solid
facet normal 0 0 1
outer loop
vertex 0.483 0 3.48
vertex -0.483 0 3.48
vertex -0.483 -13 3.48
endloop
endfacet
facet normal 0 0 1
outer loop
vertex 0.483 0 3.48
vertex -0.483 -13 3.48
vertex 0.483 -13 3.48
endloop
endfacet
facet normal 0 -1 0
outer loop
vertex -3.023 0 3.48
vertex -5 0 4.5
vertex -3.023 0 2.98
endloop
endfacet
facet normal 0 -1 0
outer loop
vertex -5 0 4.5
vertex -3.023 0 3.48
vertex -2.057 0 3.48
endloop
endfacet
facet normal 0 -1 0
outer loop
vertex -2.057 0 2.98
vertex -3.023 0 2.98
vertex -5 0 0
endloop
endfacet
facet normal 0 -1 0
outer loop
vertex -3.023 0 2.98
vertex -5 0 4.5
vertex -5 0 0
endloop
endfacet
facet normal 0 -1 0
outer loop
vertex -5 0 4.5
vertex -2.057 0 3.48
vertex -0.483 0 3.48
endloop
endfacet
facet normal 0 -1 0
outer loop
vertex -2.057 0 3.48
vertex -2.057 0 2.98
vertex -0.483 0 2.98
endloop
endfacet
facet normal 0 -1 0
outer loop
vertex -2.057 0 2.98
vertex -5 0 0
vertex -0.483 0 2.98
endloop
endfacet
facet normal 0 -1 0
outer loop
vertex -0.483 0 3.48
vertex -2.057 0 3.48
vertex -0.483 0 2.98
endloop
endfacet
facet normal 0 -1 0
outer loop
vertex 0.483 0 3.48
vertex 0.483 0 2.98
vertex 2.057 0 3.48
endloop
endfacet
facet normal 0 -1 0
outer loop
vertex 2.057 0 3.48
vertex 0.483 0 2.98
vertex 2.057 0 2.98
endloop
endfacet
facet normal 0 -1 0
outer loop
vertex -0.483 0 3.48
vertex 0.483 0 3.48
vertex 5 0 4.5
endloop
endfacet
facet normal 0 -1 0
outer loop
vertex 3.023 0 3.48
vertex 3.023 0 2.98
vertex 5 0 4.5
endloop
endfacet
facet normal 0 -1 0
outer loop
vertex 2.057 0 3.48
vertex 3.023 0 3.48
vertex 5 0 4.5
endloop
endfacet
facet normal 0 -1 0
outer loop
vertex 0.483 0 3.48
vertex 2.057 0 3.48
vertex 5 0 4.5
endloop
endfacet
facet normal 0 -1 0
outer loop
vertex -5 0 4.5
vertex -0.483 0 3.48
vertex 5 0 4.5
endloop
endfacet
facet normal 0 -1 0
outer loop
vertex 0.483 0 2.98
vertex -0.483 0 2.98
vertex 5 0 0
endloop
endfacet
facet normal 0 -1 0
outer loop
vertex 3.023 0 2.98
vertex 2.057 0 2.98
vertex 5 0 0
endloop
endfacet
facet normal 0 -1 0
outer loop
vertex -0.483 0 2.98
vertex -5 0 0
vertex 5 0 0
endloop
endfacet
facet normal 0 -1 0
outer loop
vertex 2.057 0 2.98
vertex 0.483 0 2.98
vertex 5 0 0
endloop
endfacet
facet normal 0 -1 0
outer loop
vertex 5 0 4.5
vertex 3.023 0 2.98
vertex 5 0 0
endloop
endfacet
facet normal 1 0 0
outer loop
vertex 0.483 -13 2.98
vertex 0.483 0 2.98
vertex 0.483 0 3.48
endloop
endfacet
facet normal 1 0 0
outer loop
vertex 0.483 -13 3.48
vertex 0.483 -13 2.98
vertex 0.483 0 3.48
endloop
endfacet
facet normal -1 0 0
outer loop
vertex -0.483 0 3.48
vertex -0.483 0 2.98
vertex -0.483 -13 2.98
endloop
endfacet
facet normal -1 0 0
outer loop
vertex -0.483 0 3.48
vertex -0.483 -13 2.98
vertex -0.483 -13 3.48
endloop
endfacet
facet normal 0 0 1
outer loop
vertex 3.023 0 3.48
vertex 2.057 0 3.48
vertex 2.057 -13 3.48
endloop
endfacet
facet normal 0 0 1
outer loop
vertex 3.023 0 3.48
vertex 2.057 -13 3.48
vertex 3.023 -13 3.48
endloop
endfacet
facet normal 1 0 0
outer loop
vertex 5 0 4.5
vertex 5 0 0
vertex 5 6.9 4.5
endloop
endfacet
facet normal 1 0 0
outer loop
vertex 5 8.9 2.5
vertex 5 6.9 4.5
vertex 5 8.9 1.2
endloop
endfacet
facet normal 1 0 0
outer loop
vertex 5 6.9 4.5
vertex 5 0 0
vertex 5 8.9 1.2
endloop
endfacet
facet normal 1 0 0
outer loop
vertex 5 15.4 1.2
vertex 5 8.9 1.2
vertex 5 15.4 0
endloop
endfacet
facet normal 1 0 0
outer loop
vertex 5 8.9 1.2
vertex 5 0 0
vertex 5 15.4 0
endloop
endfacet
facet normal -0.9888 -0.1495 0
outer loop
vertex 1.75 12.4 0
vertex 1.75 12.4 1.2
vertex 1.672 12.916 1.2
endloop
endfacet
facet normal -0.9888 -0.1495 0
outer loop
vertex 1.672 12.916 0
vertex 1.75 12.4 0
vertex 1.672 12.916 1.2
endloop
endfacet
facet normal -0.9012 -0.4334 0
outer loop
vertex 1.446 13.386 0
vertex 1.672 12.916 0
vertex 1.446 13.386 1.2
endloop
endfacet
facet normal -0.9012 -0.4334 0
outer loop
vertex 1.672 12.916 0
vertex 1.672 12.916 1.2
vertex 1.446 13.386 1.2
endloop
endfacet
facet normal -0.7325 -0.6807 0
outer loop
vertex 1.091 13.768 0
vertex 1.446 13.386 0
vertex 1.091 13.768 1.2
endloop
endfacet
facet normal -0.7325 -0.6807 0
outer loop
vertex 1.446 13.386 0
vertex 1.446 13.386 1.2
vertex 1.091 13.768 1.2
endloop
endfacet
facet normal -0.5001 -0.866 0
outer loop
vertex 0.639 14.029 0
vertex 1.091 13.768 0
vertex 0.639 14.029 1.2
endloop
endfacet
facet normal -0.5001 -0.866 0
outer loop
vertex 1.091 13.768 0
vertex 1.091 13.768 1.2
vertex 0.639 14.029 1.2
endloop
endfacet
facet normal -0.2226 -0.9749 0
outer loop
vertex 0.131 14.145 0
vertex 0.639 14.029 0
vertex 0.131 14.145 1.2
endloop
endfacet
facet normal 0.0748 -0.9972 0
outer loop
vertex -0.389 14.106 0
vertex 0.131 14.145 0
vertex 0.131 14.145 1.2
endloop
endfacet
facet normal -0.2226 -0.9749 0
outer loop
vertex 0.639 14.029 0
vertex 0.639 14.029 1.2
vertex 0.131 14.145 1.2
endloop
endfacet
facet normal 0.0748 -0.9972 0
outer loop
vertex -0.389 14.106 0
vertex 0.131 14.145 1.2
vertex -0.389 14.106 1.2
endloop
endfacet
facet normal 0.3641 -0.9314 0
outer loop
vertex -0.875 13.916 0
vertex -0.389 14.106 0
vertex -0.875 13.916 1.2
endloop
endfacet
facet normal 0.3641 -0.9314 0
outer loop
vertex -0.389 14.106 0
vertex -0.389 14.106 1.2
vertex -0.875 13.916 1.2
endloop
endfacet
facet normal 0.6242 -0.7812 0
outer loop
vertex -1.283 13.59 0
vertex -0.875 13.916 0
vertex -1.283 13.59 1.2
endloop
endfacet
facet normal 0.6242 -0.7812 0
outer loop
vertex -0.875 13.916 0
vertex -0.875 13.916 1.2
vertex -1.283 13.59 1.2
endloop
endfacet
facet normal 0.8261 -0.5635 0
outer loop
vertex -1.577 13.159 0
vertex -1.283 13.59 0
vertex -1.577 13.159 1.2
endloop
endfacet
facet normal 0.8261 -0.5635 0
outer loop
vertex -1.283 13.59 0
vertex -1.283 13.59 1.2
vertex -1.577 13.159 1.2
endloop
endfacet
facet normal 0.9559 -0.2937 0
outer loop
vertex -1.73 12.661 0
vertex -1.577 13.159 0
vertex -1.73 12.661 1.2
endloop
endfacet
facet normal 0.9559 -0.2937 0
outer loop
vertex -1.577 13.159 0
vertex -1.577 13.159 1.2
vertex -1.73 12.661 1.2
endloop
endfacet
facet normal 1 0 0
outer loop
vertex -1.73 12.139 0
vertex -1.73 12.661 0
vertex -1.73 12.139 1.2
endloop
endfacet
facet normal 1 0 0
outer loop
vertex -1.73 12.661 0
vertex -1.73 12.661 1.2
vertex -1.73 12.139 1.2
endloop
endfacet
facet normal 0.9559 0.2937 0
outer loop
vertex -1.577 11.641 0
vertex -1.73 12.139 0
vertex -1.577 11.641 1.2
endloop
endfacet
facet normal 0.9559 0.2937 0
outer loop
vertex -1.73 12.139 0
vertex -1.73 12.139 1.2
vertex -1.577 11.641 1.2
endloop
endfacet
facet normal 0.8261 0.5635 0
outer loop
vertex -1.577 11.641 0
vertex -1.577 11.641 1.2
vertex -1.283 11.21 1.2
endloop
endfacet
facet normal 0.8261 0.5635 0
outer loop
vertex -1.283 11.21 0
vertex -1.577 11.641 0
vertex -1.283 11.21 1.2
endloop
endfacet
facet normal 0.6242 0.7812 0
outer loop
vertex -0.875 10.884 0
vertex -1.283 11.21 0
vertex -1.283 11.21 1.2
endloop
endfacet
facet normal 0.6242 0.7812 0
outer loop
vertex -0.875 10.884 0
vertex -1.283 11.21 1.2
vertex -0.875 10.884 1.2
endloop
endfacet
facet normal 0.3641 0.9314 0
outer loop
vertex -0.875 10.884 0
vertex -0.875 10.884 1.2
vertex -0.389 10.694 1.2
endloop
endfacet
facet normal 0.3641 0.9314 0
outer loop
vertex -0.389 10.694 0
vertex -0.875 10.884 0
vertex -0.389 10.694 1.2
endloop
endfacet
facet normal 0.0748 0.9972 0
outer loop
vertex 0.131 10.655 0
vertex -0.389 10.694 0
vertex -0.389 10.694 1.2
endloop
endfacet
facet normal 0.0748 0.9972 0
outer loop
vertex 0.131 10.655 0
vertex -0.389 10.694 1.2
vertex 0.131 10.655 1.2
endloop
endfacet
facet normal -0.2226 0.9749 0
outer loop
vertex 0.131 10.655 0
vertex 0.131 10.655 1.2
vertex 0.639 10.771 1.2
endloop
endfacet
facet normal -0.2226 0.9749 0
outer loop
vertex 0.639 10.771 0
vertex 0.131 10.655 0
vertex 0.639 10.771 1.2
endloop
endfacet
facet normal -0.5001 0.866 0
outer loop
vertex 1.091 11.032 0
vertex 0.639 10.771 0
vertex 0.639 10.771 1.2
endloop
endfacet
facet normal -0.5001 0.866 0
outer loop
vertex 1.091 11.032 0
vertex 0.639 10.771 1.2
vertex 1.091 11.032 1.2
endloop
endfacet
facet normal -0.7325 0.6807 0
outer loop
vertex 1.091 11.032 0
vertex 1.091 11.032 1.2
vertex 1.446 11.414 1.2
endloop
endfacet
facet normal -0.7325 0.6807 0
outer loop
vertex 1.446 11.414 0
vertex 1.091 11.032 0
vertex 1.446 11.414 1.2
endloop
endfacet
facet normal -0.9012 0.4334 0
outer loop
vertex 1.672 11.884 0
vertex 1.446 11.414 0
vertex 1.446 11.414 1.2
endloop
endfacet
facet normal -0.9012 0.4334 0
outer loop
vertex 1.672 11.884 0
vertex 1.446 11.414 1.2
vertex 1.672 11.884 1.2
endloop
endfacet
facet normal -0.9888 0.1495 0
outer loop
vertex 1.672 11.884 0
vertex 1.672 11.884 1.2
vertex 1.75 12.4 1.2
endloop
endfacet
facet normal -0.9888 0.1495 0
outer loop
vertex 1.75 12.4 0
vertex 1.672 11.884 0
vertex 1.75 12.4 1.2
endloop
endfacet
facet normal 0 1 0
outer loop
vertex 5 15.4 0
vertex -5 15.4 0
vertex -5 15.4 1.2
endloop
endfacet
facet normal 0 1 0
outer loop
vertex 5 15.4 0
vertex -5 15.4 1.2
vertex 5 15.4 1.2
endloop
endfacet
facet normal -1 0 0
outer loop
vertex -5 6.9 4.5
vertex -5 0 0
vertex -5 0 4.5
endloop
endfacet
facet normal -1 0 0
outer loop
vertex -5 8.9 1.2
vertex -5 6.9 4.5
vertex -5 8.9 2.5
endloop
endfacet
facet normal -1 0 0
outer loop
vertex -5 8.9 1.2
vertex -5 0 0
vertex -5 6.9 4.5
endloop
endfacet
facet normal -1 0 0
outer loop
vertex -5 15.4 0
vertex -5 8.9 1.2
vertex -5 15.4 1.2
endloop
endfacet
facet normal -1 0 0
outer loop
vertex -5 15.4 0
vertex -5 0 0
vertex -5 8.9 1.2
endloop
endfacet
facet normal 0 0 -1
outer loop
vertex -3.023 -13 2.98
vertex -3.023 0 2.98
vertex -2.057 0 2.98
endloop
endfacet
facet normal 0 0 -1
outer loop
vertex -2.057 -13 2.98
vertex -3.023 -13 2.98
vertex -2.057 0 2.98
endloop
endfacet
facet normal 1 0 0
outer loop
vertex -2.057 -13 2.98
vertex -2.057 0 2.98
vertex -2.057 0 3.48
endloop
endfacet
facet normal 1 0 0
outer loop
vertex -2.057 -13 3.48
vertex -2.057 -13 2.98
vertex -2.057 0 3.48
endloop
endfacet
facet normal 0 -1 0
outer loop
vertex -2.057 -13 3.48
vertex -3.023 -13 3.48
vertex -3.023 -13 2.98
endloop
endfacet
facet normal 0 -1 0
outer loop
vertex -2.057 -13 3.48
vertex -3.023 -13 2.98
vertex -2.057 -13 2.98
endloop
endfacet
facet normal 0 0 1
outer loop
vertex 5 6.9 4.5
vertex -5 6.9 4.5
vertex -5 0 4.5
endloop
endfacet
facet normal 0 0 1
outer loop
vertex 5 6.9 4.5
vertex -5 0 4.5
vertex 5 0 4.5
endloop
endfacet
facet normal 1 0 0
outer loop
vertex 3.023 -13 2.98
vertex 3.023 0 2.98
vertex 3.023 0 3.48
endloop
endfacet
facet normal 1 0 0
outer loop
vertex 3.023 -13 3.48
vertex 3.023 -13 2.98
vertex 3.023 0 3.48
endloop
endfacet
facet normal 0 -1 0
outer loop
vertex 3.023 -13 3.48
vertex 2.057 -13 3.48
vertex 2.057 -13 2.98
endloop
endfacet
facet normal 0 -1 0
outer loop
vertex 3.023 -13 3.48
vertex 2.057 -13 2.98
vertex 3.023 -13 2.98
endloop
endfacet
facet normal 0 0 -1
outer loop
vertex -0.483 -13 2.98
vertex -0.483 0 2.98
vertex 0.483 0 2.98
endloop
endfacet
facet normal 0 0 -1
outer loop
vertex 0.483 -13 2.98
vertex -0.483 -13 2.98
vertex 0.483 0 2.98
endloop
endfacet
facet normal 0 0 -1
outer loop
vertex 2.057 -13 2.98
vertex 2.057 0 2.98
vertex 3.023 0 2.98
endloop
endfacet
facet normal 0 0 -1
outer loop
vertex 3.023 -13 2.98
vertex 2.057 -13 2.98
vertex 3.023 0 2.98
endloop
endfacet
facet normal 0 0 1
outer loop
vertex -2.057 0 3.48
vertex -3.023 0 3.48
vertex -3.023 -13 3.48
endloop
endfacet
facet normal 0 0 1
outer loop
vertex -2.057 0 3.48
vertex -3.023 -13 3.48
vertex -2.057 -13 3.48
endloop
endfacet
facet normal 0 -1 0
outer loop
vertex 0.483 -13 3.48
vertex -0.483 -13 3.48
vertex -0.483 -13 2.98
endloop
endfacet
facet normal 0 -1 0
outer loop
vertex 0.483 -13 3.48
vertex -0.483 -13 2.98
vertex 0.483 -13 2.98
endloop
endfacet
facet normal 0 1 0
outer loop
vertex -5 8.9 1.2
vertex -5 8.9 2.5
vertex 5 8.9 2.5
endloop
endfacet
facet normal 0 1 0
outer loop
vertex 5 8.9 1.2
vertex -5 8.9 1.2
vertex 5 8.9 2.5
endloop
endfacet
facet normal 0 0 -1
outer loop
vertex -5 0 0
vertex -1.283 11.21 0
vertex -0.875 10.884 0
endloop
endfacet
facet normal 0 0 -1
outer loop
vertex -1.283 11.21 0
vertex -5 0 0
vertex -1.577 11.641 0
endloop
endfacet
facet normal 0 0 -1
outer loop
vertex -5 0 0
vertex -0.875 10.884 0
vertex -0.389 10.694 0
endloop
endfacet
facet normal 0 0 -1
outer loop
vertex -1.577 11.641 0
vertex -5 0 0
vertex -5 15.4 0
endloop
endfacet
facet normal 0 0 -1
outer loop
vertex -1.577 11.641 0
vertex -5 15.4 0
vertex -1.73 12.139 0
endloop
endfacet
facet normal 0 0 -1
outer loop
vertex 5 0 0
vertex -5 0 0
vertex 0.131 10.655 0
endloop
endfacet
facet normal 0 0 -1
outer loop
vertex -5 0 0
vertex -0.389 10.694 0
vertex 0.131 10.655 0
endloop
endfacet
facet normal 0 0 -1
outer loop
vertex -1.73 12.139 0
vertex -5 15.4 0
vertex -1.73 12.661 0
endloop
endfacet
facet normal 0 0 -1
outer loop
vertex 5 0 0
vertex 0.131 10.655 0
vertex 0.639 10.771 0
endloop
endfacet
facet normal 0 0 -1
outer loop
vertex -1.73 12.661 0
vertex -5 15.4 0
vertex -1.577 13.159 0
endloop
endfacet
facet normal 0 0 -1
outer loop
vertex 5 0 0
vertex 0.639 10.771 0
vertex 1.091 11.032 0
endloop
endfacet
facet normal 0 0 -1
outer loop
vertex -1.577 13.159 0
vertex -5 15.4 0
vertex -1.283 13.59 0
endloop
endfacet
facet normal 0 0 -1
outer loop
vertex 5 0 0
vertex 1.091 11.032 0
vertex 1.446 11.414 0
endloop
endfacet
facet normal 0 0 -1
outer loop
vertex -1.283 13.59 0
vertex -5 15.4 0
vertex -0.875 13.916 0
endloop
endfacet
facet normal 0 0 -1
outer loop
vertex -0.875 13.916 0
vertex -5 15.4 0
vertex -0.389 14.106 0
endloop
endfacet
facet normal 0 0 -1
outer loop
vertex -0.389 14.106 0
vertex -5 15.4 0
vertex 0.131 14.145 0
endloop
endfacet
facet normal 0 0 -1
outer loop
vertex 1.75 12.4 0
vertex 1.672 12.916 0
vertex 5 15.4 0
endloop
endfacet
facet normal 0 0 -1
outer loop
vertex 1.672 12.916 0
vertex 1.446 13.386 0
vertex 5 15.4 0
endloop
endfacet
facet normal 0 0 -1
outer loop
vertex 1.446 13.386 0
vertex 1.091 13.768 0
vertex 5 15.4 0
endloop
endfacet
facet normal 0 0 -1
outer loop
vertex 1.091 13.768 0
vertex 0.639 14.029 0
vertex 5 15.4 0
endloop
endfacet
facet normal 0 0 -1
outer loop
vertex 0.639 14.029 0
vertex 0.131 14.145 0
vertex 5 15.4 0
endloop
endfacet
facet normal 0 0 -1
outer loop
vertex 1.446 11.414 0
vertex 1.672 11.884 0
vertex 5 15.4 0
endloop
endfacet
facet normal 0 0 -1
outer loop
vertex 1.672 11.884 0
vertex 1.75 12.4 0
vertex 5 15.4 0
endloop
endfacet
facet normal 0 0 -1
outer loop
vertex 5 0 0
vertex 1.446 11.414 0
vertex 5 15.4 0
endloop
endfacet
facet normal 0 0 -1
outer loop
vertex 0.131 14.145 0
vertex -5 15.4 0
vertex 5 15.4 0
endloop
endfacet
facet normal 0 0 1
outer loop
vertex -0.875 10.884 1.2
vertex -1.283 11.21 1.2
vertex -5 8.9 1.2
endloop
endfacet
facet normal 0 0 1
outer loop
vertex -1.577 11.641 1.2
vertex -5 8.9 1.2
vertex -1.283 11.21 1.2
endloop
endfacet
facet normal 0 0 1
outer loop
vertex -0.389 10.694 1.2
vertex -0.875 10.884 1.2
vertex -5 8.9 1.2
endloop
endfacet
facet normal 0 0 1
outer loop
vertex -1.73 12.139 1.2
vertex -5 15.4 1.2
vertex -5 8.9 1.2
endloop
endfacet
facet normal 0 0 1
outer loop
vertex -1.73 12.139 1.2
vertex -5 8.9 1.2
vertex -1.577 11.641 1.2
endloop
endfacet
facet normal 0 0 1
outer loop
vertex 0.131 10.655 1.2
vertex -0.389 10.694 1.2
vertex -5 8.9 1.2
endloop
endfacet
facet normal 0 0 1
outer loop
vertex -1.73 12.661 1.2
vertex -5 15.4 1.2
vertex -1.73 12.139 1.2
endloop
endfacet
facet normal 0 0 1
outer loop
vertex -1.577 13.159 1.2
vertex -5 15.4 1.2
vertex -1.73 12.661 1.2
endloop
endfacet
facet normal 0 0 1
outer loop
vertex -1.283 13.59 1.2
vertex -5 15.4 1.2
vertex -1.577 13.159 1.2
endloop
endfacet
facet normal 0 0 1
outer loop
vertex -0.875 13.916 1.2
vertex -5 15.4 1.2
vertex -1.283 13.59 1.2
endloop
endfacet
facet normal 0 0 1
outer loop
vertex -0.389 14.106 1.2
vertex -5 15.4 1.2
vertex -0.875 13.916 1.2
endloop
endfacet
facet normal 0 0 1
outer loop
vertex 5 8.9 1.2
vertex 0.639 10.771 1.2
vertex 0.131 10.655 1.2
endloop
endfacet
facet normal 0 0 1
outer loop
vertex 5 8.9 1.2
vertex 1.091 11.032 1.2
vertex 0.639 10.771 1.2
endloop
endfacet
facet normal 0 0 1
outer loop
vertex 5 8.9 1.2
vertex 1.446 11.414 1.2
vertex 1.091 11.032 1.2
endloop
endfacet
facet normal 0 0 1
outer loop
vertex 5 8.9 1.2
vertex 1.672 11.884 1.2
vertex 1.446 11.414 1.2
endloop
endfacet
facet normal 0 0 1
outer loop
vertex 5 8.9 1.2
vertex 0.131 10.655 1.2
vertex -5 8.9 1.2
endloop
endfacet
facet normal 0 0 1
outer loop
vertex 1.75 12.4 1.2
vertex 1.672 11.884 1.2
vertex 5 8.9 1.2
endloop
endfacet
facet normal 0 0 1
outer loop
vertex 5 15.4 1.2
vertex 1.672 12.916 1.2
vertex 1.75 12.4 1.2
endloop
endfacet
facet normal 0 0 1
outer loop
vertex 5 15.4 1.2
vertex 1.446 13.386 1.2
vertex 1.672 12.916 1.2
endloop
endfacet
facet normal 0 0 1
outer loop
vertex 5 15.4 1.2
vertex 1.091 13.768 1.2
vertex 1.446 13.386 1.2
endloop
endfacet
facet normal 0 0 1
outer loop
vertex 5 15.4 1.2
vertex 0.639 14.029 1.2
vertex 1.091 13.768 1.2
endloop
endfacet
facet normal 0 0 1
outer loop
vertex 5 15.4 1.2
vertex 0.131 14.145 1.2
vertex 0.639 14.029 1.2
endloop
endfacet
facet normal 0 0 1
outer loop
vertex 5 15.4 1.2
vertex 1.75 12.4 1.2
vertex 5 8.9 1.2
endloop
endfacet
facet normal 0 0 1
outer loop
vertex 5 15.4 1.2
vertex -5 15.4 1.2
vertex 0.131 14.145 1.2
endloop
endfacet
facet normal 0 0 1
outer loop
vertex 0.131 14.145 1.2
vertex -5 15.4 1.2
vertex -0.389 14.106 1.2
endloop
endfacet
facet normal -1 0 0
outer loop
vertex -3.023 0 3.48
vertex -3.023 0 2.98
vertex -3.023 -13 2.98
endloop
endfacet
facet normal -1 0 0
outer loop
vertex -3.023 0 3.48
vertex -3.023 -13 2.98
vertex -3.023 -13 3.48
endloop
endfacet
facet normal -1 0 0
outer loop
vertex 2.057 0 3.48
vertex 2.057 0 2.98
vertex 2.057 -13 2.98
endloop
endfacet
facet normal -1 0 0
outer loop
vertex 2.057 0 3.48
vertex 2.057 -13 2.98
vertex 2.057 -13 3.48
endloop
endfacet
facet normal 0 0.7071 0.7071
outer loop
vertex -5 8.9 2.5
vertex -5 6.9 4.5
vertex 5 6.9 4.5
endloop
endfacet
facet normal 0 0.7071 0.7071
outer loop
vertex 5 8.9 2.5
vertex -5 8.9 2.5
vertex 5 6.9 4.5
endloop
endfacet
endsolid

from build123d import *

# Parameters (mm, degrees)
SKETCH_1_W          = 10
SKETCH_1_H          = 15.4
EXTRUDE_1_DEPTH     = 4.5
SKETCH_2_W          = 10
SKETCH_2_H          = 6.5
CUT_EXTRUDE_1_DEPTH = 3.3
CHAMFER_1_SIZE      = 2
SKETCH_3_R          = 1.75
CUT_EXTRUDE_2_DEPTH = 17.524224641
SKETCH_4_W          = 0.965597518
SKETCH_4_H          = 0.5
EXTRUDE_2_DEPTH     = 13


with BuildPart() as part:
    # 草图1 → 凸台-拉伸1 (new body)
    with BuildSketch(Plane.XY):
        with Locations((0, 7.7)):
            Rectangle(SKETCH_1_W, SKETCH_1_H)
    extrude(amount=EXTRUDE_1_DEPTH)

    # 草图2 → 切除-拉伸1 (cut)
    with BuildSketch(Plane.XY.offset(4.5)):
        with Locations((0, 12.15)):
            Rectangle(SKETCH_2_W, SKETCH_2_H)
    extrude(amount=-CUT_EXTRUDE_1_DEPTH, mode=Mode.SUBTRACT)

    # 倒角1
    chamfer_1_edges = [part.edges().sort_by_distance(p)[0] for p in [
        (0, 8.9, 4.5),
    ]]
    chamfer(chamfer_1_edges, length=CHAMFER_1_SIZE)

    # 草图3 → 切除-拉伸2 (cut, through all)
    with BuildSketch(Plane.XY.offset(1.2)):
        with Locations((0, 12.4)):
            Circle(SKETCH_3_R)
    extrude(amount=-CUT_EXTRUDE_2_DEPTH, mode=Mode.SUBTRACT)

    # 草图4 → 凸台-拉伸2 (add)
    with BuildSketch(Plane.XZ):
        with Locations((2.54, 3.23)):
            Rectangle(SKETCH_4_W, SKETCH_4_H)
        with Locations((0, 3.23)):
            Rectangle(SKETCH_4_W, SKETCH_4_H)
        with Locations((-2.54, 3.23)):
            Rectangle(SKETCH_4_W, SKETCH_4_H)
    extrude(amount=EXTRUDE_2_DEPTH)


solid = part.part
